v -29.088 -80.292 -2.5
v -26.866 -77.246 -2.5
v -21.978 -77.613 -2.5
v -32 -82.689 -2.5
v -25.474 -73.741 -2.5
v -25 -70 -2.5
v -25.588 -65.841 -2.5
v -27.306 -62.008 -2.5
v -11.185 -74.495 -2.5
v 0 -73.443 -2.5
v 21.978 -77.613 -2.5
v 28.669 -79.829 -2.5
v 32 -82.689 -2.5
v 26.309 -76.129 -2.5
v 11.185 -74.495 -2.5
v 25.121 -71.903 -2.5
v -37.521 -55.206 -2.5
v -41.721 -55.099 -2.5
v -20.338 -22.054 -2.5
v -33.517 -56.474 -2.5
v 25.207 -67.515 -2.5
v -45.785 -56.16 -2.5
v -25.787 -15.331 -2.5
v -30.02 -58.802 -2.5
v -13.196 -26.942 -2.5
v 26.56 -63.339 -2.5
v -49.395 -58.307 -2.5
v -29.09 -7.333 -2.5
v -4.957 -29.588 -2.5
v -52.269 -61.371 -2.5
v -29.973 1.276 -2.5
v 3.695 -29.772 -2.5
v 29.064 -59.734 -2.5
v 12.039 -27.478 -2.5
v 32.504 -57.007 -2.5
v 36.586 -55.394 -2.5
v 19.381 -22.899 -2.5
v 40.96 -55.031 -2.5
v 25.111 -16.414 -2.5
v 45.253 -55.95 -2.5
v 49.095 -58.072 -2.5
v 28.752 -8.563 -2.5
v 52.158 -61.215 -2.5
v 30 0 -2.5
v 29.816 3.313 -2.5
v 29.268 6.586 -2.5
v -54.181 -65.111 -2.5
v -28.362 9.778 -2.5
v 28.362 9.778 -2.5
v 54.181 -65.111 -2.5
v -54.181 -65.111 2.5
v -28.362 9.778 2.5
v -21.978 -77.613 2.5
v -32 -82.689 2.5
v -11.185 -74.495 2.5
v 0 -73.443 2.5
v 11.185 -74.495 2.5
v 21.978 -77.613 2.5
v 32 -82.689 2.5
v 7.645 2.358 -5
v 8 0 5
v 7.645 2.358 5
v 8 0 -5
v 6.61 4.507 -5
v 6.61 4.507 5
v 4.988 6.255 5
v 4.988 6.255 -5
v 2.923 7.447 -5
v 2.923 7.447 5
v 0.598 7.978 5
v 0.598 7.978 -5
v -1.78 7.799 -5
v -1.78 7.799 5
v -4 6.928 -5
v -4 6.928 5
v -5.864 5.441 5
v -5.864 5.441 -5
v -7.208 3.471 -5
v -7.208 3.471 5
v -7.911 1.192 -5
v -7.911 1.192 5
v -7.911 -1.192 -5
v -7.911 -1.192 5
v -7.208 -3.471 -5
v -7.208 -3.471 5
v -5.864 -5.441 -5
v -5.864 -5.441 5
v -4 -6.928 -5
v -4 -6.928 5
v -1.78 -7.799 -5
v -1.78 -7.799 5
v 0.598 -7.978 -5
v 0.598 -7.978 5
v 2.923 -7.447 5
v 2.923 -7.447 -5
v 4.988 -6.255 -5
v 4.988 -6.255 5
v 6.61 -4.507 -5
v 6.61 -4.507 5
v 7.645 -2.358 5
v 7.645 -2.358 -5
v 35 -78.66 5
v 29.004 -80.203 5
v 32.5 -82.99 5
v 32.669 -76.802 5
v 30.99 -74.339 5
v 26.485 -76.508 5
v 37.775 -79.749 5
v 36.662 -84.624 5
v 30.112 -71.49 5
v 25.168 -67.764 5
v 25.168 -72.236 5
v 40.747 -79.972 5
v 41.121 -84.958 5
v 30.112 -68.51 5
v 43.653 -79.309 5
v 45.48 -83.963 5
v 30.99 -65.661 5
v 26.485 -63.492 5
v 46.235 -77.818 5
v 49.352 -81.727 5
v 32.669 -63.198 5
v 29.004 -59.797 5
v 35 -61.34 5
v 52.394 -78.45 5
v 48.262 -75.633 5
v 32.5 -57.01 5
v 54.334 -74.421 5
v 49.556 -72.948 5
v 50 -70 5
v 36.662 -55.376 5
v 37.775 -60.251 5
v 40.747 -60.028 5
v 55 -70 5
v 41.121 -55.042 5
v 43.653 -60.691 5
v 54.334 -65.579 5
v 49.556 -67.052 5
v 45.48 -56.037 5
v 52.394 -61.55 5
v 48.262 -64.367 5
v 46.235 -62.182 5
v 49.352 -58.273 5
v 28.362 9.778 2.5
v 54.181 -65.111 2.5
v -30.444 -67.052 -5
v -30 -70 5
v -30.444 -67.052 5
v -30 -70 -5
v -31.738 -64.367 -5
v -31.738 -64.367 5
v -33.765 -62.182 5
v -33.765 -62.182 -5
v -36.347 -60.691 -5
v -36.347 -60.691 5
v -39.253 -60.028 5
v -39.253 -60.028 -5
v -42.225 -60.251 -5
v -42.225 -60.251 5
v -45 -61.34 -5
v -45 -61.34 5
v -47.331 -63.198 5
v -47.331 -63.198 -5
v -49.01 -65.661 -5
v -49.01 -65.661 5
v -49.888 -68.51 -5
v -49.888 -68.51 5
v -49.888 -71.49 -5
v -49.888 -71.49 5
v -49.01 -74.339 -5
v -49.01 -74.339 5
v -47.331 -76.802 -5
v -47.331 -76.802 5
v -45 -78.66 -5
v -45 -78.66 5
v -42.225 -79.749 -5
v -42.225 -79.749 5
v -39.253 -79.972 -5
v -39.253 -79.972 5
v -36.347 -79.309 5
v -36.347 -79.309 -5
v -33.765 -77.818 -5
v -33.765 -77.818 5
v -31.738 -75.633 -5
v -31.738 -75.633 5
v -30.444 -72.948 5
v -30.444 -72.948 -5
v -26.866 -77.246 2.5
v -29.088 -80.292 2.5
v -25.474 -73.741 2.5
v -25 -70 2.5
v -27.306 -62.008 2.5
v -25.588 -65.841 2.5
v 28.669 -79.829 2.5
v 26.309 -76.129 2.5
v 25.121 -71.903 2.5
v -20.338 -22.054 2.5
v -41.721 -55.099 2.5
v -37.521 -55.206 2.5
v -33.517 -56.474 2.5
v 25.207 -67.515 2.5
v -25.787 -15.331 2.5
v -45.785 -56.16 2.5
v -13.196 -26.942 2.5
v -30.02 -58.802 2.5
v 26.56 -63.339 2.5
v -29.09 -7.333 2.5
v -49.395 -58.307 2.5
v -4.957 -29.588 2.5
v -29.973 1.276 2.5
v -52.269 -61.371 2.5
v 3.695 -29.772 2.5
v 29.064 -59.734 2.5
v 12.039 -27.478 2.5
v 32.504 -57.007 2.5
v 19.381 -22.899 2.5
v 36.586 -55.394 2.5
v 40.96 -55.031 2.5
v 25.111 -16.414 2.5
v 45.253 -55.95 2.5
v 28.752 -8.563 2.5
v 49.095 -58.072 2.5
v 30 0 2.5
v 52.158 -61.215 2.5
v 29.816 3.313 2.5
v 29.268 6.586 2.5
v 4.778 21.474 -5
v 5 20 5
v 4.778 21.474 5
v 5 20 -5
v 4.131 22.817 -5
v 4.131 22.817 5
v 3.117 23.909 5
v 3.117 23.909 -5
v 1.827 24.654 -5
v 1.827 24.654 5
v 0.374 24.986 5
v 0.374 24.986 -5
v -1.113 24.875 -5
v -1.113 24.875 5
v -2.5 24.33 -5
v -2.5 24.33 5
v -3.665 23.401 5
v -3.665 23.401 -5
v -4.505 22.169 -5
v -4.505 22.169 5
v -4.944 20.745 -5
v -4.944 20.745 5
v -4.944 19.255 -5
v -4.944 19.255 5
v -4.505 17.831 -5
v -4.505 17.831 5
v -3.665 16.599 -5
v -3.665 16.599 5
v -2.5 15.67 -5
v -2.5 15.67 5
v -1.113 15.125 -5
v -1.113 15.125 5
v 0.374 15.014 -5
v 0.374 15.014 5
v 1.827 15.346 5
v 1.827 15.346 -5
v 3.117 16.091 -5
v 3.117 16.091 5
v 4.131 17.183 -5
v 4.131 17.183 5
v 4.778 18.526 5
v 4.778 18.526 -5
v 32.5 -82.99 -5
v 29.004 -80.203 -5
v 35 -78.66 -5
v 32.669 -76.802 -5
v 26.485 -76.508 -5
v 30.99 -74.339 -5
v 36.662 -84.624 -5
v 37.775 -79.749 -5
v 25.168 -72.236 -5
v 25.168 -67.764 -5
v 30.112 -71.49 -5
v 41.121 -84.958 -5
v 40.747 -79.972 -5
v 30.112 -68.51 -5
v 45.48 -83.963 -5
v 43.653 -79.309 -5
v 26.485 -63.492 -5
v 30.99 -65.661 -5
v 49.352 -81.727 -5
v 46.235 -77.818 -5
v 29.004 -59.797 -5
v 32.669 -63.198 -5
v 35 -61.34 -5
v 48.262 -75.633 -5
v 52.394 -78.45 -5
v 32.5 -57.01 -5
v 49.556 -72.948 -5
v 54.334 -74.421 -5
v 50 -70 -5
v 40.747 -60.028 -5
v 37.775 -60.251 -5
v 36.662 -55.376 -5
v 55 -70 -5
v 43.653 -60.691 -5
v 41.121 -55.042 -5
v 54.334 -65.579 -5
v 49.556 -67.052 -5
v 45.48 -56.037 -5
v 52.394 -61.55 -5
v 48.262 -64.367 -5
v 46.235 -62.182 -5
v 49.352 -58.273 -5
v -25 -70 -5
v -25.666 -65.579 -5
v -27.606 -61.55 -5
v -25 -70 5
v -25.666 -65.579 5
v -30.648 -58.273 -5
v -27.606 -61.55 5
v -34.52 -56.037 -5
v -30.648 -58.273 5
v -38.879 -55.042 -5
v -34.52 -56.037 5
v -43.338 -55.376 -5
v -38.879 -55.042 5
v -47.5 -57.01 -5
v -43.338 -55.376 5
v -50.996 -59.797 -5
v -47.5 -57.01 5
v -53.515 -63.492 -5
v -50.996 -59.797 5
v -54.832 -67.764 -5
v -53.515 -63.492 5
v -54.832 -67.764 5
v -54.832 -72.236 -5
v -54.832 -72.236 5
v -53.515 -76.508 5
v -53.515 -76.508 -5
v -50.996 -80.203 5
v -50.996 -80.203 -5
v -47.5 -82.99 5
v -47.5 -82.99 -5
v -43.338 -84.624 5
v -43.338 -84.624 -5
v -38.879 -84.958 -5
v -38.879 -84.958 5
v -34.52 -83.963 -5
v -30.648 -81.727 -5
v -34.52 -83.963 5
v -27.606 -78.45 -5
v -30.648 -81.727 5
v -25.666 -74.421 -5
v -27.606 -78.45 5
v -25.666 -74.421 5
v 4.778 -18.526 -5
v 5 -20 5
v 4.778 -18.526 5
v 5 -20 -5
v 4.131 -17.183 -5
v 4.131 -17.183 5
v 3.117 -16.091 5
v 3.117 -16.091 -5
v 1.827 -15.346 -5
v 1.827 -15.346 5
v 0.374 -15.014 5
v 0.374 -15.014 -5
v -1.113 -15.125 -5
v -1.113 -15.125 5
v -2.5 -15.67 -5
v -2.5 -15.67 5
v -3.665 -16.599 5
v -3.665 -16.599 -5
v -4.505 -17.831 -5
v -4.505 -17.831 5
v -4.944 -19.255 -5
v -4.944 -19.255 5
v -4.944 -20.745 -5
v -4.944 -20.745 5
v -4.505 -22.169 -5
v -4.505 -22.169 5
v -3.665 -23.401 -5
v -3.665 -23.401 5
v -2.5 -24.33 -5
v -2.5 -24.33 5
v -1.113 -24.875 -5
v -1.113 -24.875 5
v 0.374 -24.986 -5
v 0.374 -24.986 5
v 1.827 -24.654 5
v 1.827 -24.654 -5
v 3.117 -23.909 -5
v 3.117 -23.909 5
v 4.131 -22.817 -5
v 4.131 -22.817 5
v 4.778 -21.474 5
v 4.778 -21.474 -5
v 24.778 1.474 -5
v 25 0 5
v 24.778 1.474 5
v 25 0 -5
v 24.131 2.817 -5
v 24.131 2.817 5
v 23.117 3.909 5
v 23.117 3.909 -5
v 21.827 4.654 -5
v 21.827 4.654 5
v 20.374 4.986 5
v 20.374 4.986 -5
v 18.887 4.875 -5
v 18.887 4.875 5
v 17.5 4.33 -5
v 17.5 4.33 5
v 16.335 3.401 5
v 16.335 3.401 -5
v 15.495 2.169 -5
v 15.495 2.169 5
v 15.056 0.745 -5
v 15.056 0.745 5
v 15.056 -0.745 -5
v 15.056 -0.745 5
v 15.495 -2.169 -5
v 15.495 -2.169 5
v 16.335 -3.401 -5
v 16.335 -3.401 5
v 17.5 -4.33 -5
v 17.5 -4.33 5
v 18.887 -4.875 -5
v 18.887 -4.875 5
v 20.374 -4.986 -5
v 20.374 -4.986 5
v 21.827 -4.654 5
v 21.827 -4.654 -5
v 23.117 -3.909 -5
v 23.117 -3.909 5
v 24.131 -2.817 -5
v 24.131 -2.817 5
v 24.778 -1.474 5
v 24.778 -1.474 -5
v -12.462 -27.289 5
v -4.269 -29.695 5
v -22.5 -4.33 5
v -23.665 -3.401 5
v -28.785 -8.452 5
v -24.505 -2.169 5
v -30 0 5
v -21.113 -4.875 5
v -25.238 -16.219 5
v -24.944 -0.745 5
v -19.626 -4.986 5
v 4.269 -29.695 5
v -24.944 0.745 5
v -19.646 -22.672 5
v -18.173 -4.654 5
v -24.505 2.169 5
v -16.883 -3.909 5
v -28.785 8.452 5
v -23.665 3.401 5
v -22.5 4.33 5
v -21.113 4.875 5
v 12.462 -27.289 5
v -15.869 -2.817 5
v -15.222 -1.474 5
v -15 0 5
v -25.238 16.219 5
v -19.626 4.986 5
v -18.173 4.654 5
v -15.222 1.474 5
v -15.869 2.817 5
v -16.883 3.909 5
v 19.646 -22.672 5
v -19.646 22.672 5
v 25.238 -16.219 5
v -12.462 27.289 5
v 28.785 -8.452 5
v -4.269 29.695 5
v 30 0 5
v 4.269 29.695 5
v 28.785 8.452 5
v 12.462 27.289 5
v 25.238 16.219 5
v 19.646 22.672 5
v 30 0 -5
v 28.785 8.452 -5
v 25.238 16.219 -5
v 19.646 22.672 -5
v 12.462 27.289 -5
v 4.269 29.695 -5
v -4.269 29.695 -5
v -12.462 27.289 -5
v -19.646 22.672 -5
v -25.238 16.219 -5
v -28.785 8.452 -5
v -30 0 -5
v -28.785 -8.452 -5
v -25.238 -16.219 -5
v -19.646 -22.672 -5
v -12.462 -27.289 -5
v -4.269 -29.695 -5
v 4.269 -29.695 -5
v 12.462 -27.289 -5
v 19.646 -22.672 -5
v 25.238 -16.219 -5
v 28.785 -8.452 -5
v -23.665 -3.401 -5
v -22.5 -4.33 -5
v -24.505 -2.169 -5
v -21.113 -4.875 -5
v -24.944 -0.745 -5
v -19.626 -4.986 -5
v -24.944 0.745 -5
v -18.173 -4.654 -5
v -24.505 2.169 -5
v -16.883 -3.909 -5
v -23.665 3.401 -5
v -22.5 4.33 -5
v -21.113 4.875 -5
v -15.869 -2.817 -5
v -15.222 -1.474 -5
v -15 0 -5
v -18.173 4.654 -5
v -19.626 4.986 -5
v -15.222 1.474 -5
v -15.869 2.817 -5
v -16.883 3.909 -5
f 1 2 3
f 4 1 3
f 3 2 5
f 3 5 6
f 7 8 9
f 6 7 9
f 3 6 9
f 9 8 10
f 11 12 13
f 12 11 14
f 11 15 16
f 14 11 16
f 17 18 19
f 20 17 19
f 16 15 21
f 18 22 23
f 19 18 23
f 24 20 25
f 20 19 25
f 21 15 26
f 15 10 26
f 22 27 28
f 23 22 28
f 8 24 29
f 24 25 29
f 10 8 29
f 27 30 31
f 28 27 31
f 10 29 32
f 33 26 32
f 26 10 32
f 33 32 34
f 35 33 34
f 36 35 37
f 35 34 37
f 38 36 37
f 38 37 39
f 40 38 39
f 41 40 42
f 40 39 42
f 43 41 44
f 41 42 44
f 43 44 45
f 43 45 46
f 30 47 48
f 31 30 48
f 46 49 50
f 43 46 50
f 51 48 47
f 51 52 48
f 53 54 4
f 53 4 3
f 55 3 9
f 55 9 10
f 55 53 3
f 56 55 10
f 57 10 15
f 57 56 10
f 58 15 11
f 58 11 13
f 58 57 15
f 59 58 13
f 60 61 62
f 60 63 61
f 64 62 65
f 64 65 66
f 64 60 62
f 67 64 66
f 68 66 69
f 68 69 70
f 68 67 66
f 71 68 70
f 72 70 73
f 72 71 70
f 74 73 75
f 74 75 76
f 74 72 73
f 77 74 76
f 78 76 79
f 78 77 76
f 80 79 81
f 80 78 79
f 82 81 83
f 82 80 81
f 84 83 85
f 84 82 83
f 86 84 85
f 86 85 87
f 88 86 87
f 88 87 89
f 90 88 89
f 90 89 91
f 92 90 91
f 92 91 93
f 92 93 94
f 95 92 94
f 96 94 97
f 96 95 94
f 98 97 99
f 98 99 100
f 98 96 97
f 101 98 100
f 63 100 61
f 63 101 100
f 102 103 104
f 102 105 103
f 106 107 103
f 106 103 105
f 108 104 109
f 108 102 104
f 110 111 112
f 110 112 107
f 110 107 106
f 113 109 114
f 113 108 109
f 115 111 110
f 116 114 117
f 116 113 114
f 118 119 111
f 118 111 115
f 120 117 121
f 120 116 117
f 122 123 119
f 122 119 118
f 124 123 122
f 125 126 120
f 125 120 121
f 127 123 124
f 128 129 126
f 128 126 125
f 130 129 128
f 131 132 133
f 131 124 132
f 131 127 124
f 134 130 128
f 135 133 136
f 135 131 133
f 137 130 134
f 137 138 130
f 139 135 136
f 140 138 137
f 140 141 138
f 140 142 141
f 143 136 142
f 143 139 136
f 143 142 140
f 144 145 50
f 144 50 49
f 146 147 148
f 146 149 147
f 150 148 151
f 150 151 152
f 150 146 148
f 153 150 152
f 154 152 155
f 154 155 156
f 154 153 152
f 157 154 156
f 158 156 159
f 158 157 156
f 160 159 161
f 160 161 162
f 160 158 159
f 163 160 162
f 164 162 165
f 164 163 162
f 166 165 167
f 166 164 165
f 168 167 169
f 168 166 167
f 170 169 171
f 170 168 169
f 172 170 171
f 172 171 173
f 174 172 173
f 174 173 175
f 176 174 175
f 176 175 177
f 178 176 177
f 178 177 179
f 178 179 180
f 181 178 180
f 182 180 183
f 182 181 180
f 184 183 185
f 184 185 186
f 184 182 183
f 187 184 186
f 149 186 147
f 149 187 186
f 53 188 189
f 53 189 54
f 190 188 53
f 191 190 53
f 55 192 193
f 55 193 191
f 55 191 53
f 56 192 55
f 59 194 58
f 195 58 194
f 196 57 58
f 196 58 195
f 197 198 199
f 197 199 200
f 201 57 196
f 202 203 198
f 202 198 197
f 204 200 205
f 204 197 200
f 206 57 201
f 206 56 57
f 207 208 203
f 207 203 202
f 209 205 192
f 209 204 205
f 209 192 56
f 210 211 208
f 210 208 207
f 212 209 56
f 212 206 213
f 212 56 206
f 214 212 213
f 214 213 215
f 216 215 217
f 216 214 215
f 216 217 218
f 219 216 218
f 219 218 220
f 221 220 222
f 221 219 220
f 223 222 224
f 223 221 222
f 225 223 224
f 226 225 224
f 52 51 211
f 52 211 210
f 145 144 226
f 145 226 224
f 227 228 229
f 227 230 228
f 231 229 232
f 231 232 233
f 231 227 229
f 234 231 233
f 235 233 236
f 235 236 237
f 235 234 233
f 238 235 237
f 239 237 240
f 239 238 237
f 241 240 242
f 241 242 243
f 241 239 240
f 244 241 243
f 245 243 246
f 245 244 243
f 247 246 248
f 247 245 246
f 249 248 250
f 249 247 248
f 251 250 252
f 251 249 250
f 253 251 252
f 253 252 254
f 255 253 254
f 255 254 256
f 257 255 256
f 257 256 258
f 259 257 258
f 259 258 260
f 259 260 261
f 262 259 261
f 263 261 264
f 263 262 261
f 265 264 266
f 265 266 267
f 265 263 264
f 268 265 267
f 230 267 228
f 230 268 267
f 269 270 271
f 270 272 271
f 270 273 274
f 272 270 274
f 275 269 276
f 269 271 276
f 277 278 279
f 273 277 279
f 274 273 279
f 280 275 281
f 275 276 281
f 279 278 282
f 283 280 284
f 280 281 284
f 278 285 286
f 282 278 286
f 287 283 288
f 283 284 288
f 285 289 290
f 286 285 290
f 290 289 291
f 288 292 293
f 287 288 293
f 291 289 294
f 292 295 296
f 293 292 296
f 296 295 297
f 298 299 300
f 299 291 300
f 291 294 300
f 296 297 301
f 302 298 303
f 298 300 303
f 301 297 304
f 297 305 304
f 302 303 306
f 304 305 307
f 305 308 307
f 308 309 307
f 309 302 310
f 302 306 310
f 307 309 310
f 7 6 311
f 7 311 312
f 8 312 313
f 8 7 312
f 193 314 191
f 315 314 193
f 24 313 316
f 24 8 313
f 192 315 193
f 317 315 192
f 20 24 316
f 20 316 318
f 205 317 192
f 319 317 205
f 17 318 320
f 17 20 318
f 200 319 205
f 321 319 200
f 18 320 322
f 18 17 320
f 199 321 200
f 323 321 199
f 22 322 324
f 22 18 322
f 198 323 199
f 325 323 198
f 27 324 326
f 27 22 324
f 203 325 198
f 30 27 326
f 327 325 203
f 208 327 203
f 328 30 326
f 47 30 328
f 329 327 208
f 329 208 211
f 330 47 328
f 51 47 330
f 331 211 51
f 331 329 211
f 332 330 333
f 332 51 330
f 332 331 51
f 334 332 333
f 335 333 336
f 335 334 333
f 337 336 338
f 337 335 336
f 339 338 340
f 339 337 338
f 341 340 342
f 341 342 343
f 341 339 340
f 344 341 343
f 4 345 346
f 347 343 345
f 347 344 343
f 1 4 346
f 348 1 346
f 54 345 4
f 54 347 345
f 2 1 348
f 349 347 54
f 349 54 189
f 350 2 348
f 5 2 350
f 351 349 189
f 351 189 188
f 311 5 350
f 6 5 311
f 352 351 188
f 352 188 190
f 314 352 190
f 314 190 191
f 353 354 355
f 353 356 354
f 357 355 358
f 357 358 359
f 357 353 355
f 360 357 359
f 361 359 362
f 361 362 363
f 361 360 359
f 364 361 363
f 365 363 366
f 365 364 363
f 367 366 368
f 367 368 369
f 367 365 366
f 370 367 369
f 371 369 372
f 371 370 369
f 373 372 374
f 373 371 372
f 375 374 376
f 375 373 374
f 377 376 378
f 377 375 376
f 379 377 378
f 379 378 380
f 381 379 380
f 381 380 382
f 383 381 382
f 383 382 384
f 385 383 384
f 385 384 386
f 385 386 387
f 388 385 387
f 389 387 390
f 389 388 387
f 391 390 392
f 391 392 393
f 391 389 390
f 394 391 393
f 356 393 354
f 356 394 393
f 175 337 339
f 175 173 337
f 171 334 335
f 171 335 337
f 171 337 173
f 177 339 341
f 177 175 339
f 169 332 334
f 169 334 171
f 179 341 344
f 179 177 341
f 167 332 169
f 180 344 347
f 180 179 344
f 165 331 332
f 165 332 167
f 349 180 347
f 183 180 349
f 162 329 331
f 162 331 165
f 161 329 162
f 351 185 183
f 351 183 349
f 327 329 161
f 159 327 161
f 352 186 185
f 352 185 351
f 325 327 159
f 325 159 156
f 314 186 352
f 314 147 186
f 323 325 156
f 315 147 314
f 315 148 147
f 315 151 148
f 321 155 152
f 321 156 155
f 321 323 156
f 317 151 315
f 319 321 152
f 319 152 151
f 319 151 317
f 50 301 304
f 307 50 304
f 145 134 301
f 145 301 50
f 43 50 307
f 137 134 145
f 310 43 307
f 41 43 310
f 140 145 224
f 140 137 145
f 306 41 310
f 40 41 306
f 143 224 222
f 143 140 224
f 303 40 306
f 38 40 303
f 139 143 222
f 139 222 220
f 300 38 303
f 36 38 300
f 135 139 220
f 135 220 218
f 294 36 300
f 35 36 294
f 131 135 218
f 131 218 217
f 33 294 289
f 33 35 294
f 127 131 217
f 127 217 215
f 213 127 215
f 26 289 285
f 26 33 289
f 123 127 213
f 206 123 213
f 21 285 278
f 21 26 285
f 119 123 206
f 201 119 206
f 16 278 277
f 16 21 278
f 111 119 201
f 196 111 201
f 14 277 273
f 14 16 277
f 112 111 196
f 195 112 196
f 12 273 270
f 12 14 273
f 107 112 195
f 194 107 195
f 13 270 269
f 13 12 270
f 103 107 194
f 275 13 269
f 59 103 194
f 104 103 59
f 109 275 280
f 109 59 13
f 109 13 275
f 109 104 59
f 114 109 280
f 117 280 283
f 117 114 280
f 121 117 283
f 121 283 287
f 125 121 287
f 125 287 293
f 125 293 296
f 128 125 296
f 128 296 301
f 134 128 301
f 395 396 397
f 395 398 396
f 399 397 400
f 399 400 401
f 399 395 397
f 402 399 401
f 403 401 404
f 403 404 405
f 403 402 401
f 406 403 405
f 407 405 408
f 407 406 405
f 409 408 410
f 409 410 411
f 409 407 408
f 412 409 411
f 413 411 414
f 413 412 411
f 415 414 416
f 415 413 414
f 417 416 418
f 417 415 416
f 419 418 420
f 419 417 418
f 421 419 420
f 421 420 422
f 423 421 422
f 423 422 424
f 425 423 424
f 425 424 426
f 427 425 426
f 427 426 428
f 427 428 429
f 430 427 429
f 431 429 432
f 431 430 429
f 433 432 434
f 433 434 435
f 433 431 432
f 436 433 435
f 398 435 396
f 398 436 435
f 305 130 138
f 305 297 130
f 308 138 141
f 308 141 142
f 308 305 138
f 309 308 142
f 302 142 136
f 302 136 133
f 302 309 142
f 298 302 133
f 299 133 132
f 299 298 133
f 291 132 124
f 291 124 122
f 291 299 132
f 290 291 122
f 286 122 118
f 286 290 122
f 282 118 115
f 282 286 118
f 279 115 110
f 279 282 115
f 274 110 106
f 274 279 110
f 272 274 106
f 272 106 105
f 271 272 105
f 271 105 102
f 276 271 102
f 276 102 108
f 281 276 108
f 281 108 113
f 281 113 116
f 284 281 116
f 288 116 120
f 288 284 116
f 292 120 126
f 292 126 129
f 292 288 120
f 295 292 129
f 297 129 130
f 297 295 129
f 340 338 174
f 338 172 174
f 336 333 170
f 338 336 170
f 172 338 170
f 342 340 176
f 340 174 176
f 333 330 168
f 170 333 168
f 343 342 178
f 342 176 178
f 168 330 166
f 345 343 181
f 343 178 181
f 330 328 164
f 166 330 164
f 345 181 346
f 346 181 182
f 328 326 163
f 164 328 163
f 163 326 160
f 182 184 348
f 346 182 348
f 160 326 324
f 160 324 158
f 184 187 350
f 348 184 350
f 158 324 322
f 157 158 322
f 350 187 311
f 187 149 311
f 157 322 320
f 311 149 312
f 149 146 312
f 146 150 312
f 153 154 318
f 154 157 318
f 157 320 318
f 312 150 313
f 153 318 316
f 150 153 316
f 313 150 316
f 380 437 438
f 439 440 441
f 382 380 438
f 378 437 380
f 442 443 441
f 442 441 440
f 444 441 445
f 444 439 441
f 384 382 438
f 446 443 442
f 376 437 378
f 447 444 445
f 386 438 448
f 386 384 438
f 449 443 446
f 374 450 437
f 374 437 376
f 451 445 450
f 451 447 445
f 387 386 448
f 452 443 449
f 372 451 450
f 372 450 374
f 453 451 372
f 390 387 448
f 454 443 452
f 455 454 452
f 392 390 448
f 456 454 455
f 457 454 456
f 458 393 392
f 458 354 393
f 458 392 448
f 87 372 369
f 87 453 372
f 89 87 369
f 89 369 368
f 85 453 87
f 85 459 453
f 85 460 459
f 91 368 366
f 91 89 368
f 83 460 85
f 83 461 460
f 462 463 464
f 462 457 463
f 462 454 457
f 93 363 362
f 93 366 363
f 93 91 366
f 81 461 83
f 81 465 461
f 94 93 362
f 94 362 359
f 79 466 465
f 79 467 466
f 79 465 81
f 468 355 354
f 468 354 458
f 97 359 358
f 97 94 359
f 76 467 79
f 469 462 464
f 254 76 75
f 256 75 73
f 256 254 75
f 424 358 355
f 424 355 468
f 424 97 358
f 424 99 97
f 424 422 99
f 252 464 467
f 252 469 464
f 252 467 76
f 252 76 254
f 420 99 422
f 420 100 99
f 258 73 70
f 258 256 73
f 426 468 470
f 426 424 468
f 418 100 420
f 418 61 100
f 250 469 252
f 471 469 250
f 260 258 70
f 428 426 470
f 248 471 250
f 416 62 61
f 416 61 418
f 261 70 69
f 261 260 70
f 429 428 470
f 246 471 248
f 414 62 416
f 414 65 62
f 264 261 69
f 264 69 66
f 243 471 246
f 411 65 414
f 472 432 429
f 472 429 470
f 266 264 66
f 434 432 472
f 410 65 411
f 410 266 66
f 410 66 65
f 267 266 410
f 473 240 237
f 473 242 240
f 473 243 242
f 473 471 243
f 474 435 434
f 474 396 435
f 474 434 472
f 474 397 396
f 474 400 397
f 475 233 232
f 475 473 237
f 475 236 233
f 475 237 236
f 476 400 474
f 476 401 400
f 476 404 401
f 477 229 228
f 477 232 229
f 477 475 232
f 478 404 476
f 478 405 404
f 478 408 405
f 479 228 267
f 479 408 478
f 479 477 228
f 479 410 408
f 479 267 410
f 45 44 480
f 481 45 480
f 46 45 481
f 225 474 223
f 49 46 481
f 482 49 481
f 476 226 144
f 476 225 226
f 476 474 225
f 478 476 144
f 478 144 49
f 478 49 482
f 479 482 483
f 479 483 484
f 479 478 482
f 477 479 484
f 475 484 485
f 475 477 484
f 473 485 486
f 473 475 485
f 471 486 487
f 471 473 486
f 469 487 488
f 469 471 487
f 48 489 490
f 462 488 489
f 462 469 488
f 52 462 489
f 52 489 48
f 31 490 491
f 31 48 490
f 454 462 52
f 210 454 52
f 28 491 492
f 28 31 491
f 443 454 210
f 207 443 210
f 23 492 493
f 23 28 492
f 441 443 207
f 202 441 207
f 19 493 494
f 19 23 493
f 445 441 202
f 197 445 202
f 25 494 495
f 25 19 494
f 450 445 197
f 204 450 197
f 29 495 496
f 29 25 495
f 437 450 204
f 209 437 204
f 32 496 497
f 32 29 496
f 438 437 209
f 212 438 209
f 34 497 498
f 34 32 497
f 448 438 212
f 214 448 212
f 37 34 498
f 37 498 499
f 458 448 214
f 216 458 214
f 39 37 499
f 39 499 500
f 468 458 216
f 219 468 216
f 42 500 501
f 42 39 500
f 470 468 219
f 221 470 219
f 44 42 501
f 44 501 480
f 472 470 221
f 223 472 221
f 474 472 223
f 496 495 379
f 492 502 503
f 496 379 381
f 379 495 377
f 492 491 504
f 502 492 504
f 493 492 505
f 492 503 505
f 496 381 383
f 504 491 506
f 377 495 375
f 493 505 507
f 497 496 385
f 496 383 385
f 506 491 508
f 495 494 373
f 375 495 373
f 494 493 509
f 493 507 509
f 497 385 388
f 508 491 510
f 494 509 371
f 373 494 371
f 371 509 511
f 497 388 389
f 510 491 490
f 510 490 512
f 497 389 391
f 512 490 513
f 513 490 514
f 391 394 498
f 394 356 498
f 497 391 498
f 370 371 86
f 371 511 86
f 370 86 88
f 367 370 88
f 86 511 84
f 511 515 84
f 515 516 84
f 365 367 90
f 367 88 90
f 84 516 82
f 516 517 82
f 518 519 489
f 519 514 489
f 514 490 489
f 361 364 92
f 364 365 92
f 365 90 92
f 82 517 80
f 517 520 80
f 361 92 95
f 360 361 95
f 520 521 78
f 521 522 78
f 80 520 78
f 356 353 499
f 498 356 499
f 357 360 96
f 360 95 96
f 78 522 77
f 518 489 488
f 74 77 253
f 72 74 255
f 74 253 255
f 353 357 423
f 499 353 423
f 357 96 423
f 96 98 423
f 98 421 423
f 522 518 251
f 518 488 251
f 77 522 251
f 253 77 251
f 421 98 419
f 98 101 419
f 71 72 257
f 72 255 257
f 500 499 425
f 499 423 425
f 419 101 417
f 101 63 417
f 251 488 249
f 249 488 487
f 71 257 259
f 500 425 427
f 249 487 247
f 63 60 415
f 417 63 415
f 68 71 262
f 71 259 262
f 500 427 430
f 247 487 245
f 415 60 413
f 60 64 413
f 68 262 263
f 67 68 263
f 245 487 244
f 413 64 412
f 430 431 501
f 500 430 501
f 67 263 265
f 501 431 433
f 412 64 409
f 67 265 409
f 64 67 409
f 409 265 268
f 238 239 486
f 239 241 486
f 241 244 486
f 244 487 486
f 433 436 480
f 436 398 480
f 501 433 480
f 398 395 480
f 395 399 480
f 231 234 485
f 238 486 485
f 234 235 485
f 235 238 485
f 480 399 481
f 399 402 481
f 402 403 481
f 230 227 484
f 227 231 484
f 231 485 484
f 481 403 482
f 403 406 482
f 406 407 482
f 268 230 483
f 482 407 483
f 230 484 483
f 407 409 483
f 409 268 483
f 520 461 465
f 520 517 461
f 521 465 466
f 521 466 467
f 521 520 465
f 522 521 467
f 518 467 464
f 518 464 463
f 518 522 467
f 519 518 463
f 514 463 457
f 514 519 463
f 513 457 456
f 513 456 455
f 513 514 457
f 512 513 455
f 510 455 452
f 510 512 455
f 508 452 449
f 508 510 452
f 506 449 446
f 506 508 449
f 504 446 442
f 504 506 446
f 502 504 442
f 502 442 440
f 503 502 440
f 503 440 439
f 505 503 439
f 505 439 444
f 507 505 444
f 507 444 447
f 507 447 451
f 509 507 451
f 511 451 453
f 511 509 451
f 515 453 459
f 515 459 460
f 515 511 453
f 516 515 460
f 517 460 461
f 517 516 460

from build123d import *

# Parameters (mm, degrees)
SKETCH1_R             = 15
SKETCH1_R_2           = 10
BOSS_EXTRUDE1_DEPTH   = 5
SKETCH1_R_3           = 30
SKETCH1_R_4           = 5
SKETCH1_R_5           = 8
BOSS_EXTRUDE1_2_DEPTH = 5
BOSS_EXTRUDE1_3_DEPTH = 5
BOSS_EXTRUDE2_DEPTH   = 2.5


with BuildPart() as part:
    # Sketch1 → Boss-Extrude1 (new, symmetric)
    with BuildSketch(Plane.XY):
        with Locations((-40, -70)):
            Circle(SKETCH1_R)
        with Locations((-40, -70)):
            Circle(SKETCH1_R_2, mode=Mode.SUBTRACT)
    extrude(amount=BOSS_EXTRUDE1_DEPTH, both=True)



with BuildPart() as body_2:
    # Sketch1 → Boss-Extrude1 2 (new, symmetric)
    with BuildSketch(Plane.XY):
        Circle(SKETCH1_R_3)
        with Locations((-20, 0)):
            Circle(SKETCH1_R_4, mode=Mode.SUBTRACT)
        with Locations((0, -20)):
            Circle(SKETCH1_R_4, mode=Mode.SUBTRACT)
        Circle(SKETCH1_R_5, mode=Mode.SUBTRACT)
        with Locations((20, 0)):
            Circle(SKETCH1_R_4, mode=Mode.SUBTRACT)
        with Locations((0, 20)):
            Circle(SKETCH1_R_4, mode=Mode.SUBTRACT)
    extrude(amount=BOSS_EXTRUDE1_2_DEPTH, both=True)


with BuildPart() as body_3:
    # Sketch1 → Boss-Extrude1 3 (new, symmetric)
    with BuildSketch(Plane.XY):
        with Locations((40, -70)):
            Circle(SKETCH1_R)
        with Locations((40, -70)):
            Circle(SKETCH1_R_2, mode=Mode.SUBTRACT)
    extrude(amount=BOSS_EXTRUDE1_3_DEPTH, both=True)


with BuildPart() as part_1:
    add(part.part)

    add(body_2.part)  # Boss-Extrude2 merges body 2

    add(body_3.part)  # Boss-Extrude2 merges body 3
    # Sketch1<3> → Boss-Extrude2 (add, symmetric)
    with BuildSketch(Plane.XY):
        with BuildLine():
            Line((-28.361736144, 9.778134939), (-54.180868072, -65.11093253))
            ThreePointArc((-54.180868072, -65.11093253), (-37.521393646, -55.206200267), (-25, -70))
            ThreePointArc((-25, -70), (-26.866074463, -77.245688373), (-32, -82.68857754))
            ThreePointArc((-32, -82.68857754), (0, -73.442887702), (32, -82.68857754))
            ThreePointArc((32, -82.68857754), (30.683660399, -58.24390301), (54.180868072, -65.11093253))
            Line((54.180868072, -65.11093253), (28.361736144, 9.778134939))
            ThreePointArc((28.361736144, 9.778134939), (29.587599466, 4.957212709), (30, 0))
            ThreePointArc((30, 0), (-4.957212709, -29.587599466), (-28.361736144, 9.778134939))
        make_face()
    extrude(amount=BOSS_EXTRUDE2_DEPTH, both=True)


solid = part_1.part
